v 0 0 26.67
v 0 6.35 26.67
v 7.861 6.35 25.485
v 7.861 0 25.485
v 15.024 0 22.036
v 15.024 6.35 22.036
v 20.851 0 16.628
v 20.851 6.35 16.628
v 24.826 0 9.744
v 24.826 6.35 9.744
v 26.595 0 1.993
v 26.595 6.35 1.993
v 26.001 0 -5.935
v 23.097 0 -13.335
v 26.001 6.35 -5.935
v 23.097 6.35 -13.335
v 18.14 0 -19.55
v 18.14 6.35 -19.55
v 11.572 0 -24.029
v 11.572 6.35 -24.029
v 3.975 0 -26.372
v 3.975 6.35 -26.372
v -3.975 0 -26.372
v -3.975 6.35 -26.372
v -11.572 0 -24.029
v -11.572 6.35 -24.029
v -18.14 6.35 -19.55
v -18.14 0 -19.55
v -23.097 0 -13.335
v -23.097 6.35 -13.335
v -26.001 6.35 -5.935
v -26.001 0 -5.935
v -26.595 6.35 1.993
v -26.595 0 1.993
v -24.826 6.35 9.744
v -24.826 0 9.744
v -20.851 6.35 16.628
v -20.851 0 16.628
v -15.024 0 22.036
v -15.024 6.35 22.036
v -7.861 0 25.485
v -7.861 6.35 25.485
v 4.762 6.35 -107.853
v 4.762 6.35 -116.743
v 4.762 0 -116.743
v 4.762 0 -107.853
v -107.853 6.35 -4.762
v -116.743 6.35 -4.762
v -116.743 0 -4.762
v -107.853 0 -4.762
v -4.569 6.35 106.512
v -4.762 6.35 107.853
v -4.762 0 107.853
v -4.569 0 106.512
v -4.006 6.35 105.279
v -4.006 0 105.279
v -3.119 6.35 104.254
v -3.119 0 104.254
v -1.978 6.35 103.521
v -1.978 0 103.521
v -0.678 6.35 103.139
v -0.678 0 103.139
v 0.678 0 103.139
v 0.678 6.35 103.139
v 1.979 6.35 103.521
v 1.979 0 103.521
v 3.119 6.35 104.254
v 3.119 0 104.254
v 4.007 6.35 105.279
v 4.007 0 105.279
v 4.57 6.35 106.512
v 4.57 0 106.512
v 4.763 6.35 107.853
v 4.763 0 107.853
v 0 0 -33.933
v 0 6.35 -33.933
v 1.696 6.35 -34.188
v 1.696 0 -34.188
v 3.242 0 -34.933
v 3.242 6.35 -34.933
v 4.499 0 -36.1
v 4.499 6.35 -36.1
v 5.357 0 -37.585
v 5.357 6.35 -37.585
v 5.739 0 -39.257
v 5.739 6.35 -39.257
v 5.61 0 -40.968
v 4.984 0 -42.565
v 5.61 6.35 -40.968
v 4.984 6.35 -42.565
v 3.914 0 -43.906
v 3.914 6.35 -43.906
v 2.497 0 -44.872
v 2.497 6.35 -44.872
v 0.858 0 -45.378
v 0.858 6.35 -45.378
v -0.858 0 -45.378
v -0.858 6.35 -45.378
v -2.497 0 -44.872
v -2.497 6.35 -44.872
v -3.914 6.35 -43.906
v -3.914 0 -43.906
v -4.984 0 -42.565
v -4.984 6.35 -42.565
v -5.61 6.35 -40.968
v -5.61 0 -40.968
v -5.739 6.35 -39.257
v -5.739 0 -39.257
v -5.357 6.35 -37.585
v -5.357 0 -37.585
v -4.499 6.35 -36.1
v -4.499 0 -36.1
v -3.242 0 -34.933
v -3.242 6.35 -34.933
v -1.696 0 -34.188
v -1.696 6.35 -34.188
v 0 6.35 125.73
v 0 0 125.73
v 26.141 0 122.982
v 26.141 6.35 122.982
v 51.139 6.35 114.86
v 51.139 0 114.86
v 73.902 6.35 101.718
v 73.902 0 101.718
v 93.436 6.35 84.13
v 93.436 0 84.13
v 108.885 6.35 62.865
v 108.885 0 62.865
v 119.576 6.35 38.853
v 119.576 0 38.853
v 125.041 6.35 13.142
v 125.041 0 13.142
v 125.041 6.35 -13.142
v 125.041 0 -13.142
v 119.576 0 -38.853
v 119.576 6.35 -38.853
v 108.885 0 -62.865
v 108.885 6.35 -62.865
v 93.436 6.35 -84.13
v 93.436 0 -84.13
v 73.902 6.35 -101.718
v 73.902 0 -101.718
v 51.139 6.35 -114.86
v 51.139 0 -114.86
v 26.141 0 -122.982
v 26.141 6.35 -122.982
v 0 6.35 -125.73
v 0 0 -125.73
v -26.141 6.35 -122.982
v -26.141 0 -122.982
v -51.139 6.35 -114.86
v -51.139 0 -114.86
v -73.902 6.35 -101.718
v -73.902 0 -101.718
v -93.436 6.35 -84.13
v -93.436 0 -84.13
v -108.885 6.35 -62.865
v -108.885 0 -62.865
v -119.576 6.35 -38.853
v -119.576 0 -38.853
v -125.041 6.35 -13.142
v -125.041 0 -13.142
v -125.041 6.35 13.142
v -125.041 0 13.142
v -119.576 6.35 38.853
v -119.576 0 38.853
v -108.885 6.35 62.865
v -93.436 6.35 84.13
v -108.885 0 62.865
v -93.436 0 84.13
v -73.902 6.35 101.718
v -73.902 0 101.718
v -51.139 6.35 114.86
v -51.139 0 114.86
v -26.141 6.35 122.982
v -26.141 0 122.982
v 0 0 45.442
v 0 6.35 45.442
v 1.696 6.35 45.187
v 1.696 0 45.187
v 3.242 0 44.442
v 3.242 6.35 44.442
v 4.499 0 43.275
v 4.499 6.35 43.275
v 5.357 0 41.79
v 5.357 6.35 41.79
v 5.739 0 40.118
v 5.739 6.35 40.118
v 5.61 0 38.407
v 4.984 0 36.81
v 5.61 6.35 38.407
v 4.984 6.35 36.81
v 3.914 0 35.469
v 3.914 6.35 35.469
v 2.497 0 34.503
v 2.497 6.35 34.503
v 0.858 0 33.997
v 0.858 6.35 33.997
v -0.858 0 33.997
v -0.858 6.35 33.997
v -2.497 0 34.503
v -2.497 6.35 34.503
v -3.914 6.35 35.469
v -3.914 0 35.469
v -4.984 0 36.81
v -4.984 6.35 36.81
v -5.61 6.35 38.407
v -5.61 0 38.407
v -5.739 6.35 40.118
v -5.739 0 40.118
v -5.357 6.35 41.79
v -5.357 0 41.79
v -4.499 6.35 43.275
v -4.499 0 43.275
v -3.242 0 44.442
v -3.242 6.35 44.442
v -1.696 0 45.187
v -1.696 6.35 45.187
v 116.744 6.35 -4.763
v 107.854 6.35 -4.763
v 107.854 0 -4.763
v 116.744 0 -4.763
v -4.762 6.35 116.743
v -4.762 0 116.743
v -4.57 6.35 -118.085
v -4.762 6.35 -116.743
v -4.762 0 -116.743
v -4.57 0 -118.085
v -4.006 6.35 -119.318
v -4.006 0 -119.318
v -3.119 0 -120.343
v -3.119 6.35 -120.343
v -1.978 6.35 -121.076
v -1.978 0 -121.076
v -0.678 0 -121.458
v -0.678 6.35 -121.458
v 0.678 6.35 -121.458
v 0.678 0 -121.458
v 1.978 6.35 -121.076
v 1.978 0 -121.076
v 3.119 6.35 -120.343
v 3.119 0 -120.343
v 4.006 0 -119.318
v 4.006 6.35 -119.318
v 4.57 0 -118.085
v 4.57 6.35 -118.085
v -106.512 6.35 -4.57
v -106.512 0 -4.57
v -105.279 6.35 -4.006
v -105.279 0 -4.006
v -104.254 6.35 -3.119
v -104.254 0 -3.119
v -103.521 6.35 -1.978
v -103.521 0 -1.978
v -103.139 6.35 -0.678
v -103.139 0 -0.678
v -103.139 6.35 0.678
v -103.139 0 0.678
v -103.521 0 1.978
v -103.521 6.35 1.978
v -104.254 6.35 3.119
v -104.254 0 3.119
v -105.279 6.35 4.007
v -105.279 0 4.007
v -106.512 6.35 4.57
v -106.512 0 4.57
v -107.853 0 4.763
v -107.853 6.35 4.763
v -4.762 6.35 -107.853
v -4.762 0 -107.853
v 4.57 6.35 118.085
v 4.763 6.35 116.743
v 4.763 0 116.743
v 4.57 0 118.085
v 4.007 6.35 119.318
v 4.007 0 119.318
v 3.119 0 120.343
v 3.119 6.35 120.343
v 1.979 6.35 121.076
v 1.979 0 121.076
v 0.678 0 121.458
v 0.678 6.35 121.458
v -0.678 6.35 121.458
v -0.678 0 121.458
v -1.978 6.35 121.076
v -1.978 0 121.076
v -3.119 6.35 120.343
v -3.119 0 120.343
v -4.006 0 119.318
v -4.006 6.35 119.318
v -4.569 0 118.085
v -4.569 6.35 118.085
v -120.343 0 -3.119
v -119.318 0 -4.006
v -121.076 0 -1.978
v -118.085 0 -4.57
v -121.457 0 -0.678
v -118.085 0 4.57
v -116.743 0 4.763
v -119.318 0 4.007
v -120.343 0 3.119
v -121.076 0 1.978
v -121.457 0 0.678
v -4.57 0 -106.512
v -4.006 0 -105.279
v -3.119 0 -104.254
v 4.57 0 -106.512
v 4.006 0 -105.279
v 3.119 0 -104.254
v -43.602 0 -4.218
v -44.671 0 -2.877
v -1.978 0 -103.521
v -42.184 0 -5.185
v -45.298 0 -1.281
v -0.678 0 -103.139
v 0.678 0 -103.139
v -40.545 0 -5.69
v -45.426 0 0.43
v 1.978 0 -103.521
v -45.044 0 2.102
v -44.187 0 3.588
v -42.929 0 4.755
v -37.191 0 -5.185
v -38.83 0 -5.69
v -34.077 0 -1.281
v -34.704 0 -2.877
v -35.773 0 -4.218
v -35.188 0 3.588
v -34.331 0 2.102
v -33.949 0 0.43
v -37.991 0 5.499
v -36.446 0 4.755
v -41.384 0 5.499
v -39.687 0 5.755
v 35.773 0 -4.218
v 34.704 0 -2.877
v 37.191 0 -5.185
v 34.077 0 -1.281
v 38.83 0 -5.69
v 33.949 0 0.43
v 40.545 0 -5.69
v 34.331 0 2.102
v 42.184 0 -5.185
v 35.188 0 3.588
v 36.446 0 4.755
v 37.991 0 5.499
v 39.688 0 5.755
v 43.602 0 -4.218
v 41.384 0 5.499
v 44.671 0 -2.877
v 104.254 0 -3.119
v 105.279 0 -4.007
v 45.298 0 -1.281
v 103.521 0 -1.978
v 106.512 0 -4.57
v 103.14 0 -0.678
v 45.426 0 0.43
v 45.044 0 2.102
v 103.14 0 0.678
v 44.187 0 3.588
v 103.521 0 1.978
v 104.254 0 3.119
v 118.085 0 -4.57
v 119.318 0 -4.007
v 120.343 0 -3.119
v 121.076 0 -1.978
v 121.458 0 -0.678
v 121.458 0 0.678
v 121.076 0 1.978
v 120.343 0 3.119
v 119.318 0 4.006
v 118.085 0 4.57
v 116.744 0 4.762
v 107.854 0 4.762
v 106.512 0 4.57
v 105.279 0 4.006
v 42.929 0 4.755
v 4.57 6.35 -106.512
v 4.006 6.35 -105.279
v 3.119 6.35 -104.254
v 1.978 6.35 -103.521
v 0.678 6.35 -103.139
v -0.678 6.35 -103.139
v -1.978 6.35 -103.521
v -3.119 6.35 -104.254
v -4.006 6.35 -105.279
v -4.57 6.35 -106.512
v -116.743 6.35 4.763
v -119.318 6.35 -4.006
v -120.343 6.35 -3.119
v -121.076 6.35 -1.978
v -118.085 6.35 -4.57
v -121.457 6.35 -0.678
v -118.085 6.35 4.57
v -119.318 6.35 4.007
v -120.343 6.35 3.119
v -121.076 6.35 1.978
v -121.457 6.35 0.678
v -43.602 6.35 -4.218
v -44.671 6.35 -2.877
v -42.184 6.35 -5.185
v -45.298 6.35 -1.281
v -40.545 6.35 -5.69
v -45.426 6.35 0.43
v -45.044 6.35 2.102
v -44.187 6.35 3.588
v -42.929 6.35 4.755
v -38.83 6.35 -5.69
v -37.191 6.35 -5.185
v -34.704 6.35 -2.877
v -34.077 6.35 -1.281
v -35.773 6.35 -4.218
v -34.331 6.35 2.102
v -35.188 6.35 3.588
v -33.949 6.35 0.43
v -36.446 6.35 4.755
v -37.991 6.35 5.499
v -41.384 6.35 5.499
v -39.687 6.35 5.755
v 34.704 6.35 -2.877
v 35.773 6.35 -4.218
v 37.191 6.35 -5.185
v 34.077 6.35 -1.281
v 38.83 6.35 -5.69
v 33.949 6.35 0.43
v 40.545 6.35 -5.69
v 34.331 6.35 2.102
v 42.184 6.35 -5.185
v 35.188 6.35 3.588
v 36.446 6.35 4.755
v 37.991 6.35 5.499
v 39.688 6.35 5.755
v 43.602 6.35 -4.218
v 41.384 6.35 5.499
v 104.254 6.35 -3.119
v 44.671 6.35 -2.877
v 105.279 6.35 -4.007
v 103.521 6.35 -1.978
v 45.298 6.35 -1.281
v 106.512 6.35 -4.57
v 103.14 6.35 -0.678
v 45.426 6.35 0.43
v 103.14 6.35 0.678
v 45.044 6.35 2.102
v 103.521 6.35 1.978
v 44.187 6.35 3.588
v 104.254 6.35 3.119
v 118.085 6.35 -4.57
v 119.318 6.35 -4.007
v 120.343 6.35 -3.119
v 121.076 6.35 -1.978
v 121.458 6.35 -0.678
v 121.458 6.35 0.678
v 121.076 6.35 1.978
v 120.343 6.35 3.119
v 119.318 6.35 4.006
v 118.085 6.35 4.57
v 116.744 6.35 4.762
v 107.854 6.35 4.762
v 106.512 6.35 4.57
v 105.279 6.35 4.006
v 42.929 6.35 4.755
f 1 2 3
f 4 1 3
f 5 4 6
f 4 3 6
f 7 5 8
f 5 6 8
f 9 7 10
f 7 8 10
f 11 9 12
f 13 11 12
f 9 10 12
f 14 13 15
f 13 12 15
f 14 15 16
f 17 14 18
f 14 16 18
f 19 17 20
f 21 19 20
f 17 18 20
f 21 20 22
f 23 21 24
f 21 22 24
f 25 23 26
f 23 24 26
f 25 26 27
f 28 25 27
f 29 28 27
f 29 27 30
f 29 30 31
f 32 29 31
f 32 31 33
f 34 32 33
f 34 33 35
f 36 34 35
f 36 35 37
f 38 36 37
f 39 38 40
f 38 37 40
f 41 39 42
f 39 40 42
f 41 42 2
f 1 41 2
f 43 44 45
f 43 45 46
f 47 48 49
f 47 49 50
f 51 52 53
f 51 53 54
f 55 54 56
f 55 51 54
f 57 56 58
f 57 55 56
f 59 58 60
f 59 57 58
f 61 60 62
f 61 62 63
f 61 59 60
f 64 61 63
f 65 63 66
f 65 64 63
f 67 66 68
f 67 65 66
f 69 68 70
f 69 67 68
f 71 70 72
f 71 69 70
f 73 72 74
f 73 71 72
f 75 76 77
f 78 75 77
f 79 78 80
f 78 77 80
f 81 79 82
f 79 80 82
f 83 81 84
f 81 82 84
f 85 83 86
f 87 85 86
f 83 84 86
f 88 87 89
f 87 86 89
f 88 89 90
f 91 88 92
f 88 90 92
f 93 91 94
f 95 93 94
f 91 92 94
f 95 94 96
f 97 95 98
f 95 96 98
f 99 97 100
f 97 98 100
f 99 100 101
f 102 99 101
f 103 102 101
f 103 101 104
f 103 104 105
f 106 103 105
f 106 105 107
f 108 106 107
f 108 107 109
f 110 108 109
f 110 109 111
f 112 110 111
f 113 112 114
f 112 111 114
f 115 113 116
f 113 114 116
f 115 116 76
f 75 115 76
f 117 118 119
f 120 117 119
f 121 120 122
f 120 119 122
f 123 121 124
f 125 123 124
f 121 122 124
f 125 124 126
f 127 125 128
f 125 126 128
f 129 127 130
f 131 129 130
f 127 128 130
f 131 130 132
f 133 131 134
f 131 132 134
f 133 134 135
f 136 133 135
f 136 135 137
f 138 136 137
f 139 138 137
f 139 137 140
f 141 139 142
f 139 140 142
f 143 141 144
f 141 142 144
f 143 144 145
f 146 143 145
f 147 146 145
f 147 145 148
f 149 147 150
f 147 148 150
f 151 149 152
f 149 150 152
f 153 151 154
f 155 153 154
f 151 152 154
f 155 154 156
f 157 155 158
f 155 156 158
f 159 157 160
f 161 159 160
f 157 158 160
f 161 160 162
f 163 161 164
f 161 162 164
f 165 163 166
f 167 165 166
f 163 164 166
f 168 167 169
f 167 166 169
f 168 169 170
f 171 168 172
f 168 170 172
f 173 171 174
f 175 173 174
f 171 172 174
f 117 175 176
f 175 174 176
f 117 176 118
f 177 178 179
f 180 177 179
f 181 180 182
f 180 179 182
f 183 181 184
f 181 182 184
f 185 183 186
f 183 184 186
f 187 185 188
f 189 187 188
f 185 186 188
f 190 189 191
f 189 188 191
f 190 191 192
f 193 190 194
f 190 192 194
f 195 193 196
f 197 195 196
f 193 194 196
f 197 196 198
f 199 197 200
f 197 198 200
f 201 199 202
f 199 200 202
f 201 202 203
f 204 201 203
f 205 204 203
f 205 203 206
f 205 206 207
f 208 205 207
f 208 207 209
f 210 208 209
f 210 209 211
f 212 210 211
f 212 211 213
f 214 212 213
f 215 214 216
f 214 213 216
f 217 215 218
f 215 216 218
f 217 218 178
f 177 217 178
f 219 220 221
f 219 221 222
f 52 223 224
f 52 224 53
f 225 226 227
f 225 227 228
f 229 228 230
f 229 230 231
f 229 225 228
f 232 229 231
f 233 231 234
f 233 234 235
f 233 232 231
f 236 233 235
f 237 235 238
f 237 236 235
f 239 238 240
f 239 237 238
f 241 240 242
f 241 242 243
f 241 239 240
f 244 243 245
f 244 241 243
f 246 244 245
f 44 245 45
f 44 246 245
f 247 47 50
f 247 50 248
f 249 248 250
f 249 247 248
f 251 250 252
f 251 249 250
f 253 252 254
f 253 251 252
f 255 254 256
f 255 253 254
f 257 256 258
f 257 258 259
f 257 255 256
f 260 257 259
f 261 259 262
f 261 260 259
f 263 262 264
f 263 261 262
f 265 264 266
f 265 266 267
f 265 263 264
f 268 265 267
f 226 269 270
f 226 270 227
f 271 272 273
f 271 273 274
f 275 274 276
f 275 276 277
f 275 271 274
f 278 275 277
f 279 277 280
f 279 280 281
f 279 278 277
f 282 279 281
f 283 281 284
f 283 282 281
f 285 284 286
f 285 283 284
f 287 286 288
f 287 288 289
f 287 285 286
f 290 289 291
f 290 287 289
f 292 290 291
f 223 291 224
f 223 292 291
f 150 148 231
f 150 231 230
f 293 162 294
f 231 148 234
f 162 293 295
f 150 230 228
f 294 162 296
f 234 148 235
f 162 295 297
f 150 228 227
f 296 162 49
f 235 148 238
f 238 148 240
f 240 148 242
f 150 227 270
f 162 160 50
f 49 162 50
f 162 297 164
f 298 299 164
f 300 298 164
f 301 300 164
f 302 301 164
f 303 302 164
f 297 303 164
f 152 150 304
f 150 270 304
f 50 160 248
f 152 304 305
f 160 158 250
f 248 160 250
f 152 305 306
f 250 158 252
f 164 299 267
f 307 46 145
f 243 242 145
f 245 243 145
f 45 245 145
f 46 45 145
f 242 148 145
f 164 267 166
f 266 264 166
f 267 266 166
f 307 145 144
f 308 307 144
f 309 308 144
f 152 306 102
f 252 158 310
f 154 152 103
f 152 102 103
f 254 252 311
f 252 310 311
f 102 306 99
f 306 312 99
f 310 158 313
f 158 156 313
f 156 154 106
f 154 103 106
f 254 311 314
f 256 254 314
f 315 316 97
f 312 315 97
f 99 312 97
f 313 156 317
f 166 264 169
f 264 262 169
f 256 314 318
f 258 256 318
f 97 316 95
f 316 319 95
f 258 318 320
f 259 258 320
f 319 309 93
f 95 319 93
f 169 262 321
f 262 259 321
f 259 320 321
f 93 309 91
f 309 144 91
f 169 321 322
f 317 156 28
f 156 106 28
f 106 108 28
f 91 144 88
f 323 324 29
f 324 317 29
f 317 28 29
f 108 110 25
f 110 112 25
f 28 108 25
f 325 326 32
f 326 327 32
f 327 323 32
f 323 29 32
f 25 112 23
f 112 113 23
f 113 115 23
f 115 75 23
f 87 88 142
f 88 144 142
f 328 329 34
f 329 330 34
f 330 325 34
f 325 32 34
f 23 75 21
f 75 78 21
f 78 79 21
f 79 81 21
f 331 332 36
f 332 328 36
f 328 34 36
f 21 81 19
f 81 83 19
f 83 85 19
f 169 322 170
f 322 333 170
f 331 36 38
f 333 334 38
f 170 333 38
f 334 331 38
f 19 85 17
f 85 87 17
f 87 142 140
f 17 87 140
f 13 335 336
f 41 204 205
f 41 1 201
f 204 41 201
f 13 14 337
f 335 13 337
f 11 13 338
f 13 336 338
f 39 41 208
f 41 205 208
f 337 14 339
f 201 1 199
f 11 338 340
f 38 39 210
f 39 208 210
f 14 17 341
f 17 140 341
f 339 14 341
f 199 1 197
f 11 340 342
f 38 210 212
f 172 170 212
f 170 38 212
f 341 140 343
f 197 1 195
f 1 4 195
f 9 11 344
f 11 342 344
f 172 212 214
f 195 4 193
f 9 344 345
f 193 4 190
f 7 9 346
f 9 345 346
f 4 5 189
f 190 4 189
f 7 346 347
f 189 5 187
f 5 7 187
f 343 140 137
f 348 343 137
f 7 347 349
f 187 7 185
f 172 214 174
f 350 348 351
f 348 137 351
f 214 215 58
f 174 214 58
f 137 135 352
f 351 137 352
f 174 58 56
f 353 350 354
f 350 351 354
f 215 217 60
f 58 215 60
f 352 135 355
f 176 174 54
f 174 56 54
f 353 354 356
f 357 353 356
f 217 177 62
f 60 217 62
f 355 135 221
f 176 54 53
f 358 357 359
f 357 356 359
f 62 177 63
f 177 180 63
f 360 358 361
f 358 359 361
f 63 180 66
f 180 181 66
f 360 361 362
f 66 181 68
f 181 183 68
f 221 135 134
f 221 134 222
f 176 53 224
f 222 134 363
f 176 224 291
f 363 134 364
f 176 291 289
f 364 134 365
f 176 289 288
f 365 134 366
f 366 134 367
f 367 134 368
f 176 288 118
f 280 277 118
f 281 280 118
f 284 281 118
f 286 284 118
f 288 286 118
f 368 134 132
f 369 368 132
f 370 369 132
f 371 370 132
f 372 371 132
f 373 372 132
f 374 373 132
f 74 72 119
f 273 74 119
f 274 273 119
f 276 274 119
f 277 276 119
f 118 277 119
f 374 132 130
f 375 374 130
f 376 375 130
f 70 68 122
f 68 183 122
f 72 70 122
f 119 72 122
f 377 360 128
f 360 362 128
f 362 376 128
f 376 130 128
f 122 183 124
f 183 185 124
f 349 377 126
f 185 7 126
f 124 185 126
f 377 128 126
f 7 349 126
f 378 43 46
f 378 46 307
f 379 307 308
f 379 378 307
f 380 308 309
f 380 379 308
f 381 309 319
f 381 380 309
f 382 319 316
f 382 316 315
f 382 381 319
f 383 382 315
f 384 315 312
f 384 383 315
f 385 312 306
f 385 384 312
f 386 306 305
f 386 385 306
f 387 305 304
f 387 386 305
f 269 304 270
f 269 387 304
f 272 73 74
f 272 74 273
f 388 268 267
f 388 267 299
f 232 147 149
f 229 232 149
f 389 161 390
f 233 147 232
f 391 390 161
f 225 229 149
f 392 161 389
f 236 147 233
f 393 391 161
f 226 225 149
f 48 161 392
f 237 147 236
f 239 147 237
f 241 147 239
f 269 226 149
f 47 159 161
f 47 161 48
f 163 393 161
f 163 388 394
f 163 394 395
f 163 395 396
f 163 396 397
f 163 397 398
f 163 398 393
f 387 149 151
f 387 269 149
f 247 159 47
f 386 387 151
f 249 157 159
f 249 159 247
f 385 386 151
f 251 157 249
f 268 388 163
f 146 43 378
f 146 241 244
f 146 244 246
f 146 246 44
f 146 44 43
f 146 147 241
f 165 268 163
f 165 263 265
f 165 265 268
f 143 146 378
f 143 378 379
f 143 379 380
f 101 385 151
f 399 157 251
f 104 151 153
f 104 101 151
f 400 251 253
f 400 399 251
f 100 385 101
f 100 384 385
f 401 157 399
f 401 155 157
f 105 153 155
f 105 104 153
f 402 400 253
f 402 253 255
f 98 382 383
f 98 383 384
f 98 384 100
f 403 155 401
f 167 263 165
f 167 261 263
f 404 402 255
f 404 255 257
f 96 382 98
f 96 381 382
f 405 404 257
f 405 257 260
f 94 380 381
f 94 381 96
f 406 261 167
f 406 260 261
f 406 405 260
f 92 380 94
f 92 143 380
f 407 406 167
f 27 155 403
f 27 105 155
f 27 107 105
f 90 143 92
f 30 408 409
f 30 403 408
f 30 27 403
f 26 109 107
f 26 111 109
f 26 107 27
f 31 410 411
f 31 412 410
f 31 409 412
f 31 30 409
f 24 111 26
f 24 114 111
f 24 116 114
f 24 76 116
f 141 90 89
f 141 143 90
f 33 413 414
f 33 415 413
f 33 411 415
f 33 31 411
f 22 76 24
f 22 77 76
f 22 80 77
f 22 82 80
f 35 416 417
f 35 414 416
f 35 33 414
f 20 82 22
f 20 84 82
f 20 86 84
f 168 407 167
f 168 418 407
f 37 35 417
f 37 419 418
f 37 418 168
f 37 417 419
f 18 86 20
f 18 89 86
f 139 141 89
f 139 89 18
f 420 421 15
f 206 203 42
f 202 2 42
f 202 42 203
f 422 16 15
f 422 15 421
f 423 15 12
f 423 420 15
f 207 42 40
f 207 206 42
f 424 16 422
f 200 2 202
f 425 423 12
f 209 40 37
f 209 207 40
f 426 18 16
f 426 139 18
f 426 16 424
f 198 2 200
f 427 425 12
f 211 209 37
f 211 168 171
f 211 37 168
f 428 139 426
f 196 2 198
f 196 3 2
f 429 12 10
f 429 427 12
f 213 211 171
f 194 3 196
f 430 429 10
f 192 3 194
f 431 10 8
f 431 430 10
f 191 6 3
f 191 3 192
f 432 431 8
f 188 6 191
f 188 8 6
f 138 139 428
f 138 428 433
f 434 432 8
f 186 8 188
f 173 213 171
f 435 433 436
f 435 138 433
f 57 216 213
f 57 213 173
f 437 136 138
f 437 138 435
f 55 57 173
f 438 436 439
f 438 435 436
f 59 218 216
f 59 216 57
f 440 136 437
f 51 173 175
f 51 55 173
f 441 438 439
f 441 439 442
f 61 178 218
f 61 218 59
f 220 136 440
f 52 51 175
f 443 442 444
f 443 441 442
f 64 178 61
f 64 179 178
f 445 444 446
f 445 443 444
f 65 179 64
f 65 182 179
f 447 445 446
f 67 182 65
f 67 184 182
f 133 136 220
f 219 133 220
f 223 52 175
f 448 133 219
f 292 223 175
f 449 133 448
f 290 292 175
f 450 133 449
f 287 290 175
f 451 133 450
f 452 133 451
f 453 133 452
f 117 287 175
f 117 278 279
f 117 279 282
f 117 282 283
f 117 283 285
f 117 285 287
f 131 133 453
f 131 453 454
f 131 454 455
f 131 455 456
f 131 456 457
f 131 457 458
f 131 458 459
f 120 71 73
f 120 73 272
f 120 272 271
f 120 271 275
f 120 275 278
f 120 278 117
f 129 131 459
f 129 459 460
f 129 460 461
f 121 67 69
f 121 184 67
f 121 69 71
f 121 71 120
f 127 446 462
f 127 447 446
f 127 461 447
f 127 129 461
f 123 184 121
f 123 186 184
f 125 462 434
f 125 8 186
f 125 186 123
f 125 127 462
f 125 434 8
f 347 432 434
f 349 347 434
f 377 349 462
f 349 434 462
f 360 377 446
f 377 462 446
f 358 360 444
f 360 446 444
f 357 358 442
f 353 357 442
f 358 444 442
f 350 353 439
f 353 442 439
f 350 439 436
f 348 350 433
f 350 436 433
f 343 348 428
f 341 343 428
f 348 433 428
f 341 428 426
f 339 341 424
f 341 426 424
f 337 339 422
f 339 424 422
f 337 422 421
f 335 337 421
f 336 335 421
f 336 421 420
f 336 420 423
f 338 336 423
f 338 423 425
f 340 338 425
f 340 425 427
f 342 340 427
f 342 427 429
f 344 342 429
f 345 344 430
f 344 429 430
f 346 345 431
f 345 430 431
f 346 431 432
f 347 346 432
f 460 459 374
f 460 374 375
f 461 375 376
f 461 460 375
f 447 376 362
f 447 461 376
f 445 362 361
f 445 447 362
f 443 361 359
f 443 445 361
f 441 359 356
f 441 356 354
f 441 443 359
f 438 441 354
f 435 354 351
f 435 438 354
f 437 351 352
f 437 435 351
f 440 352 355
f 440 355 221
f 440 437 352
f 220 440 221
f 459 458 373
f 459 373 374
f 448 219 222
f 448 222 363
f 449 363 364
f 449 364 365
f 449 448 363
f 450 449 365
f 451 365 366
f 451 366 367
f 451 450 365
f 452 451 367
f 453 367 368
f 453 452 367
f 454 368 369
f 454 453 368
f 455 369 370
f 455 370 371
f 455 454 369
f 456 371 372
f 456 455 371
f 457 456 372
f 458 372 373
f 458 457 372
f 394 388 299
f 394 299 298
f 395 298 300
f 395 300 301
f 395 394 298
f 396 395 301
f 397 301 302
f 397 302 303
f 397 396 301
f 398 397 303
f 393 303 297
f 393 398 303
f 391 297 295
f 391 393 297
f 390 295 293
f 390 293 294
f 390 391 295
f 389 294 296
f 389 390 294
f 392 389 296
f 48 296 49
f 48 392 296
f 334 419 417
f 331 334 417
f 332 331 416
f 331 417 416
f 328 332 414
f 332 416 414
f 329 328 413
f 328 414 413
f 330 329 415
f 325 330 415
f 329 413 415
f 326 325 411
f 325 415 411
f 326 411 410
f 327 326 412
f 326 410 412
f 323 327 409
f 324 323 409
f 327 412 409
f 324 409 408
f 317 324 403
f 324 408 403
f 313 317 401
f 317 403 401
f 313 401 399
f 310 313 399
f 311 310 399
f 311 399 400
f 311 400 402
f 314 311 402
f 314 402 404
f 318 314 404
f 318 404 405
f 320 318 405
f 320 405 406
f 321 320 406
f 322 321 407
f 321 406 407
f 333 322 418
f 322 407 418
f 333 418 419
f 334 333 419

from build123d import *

# Parameters (mm, degrees)
SKETCH2_R           = 125.73
BOSS_EXTRUDE1_DEPTH = 6.35
SKETCH3_R           = 5.7546875
SKETCH3_R_2         = 26.67
CUT_EXTRUDE1_DEPTH  = 6.35


with BuildPart() as part:
    # Sketch2 → Boss-Extrude1 (new body)
    with BuildSketch(Plane(origin=(0, 0, 0), x_dir=(1, 0, 0), z_dir=(0, 1, 0))):
        with Locations(Location((0, 0, 0), (0, 0, 270))):
            Circle(SKETCH2_R)
    extrude(amount=BOSS_EXTRUDE1_DEPTH)

    # Sketch3 → Cut-Extrude1 (cut)
    with BuildSketch(Plane(origin=(0, 6.35, 0), x_dir=(1, 0, 0), z_dir=(0, 1, 0))):
        with Locations(Location((4.9245e-05, 39.6875, 0), (0, 0, 270))):
            Circle(SKETCH3_R)
        with Locations(Location((39.687549245, 0, 0), (0, 0, 270))):
            Circle(SKETCH3_R)
        with Locations(Location((4.9245e-05, -39.6875, 0), (0, 0, 270))):
            Circle(SKETCH3_R)
        with Locations(Location((-39.687450755, 0, 0), (0, 0, 270))):
            Circle(SKETCH3_R)
        with Locations(Location((0, 0, 0), (0, 0, 270))):
            Circle(SKETCH3_R_2)
        with BuildLine():
            Line((-4.7625, 107.85348), (-4.7625, 116.74348))
            ThreePointArc((-4.7625, 116.74348), (0, 121.50598), (4.7625, 116.74348))
            Line((4.7625, 116.74348), (4.7625, 107.85348))
            ThreePointArc((4.7625, 107.85348), (0, 103.09098), (-4.7625, 107.85348))
        make_face()
        with BuildLine():
            Line((107.853529245, 4.762549245), (116.743529245, 4.762549245))
            ThreePointArc((116.743529245, 4.762549245), (121.506029245, 4.9245e-05), (116.743529245, -4.762450755))
            Line((116.743529245, -4.762450755), (107.853529245, -4.762450755))
            ThreePointArc((107.853529245, -4.762450755), (103.091029245, 4.9245e-05), (107.853529245, 4.762549245))
        make_face()
        with BuildLine():
            Line((4.762598491, -107.85348), (4.762598491, -116.74348))
            ThreePointArc((4.762598491, -116.74348), (9.8491e-05, -121.50598), (-4.762401509, -116.74348))
            Line((-4.762401509, -116.74348), (-4.762401509, -107.85348))
            ThreePointArc((-4.762401509, -107.85348), (9.8491e-05, -103.09098), (4.762598491, -107.85348))
        make_face()
        with BuildLine():
            Line((-107.853430755, -4.762549245), (-116.743430755, -4.762549245))
            ThreePointArc((-116.743430755, -4.762549245), (-121.505930755, -4.9245e-05), (-116.743430755, 4.762450755))
            Line((-116.743430755, 4.762450755), (-107.853430755, 4.762450755))
            ThreePointArc((-107.853430755, 4.762450755), (-103.090930755, -4.9245e-05), (-107.853430755, -4.762549245))
        make_face()
    extrude(amount=-CUT_EXTRUDE1_DEPTH, mode=Mode.SUBTRACT)


solid = part.part
